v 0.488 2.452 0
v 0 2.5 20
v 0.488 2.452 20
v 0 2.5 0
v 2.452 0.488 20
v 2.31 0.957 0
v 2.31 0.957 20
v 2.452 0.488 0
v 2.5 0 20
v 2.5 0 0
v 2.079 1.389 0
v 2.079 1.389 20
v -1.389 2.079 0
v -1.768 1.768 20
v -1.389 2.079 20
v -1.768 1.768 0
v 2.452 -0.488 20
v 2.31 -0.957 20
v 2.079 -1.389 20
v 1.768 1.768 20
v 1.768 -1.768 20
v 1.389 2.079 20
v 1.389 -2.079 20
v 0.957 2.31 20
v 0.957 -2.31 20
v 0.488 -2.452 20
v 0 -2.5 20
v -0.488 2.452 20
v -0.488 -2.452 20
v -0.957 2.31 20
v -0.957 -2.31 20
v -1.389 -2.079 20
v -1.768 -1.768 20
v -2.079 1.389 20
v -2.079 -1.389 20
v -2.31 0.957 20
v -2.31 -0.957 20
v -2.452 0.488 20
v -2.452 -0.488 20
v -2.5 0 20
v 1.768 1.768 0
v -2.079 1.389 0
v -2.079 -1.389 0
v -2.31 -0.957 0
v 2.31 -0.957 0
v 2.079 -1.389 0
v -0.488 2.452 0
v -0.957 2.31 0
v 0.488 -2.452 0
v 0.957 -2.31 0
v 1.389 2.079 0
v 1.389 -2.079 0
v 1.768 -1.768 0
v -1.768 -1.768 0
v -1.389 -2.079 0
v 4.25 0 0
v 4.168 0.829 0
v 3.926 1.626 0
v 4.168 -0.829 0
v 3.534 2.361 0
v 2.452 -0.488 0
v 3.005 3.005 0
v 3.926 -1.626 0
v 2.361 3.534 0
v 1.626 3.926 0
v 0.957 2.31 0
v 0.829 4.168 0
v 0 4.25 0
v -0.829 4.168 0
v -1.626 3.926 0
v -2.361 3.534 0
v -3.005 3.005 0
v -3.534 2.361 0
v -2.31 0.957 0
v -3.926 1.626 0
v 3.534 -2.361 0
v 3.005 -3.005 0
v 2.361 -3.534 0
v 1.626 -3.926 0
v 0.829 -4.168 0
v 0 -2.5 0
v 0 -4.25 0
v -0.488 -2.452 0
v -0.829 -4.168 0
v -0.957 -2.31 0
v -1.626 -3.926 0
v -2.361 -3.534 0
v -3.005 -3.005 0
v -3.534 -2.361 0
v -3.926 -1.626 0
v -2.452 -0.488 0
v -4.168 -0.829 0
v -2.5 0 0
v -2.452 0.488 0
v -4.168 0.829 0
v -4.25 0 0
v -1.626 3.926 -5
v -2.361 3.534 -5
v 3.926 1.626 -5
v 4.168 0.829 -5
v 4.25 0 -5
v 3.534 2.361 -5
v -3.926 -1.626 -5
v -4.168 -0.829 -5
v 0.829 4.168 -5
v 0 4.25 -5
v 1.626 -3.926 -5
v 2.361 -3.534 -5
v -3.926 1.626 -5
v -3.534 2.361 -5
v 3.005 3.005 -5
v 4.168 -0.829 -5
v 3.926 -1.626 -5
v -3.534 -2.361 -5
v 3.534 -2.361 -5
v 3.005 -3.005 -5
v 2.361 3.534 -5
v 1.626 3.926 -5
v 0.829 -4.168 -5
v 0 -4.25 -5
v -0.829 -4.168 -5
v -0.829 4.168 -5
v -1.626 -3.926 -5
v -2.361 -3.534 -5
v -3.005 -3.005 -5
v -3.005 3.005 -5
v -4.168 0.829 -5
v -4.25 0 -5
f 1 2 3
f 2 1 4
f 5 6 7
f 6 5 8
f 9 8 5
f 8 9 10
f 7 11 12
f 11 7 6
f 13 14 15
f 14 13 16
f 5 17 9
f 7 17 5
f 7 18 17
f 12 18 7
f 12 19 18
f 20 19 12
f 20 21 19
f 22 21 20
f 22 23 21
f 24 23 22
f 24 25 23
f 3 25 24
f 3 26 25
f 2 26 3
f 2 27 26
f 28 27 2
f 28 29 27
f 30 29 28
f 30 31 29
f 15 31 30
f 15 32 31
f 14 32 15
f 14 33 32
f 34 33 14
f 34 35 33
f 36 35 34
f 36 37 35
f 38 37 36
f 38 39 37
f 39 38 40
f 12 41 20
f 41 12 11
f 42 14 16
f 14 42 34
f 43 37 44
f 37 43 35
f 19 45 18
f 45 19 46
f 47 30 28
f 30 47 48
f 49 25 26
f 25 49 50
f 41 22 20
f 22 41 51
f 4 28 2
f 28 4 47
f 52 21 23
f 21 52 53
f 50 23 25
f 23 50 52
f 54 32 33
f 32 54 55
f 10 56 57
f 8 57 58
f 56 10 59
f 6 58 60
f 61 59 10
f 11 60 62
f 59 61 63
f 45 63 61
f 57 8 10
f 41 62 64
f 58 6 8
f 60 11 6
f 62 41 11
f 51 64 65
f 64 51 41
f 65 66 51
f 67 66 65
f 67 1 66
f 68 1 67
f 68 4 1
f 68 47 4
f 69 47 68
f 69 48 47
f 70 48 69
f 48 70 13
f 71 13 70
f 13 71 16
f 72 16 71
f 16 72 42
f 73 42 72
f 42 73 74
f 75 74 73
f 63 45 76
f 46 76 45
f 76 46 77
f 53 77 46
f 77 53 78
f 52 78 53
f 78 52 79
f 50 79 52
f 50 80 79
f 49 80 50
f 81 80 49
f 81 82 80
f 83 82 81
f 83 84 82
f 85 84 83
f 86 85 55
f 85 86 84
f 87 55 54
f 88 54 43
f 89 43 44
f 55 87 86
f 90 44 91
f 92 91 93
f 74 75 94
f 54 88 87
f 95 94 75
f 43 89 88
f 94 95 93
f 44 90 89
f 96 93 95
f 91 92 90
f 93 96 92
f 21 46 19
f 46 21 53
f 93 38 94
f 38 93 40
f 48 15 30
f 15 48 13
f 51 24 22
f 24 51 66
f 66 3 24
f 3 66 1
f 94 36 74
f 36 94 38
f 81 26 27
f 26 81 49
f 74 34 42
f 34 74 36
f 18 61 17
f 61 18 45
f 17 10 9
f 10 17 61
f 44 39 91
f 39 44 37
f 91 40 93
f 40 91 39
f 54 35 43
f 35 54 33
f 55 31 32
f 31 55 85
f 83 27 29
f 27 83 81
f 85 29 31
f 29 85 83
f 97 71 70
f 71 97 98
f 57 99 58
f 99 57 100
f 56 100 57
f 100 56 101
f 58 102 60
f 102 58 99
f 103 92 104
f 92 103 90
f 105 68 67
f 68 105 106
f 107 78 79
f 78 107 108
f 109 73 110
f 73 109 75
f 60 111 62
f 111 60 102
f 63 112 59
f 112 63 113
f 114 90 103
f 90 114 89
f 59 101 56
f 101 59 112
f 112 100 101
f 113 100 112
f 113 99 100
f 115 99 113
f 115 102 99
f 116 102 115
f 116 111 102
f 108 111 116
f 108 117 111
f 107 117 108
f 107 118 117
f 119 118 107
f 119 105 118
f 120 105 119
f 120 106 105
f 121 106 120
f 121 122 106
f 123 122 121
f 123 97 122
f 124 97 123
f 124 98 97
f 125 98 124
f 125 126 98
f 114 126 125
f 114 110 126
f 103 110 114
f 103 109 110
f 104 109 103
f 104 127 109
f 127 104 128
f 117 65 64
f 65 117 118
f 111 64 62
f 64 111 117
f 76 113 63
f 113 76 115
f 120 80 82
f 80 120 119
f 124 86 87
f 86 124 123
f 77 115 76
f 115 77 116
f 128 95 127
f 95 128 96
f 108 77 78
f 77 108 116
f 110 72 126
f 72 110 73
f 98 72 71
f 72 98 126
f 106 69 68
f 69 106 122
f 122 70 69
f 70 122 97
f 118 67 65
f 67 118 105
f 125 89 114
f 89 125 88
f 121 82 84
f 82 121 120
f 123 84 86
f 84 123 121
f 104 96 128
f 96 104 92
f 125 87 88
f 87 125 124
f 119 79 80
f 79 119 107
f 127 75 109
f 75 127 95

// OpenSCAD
// Purchased hardware envelope; no modeled threads, not print.
$fn=32;
union(){cylinder(d=5,h=20);translate([0,0,-5])cylinder(d=8.5,h=5);}
